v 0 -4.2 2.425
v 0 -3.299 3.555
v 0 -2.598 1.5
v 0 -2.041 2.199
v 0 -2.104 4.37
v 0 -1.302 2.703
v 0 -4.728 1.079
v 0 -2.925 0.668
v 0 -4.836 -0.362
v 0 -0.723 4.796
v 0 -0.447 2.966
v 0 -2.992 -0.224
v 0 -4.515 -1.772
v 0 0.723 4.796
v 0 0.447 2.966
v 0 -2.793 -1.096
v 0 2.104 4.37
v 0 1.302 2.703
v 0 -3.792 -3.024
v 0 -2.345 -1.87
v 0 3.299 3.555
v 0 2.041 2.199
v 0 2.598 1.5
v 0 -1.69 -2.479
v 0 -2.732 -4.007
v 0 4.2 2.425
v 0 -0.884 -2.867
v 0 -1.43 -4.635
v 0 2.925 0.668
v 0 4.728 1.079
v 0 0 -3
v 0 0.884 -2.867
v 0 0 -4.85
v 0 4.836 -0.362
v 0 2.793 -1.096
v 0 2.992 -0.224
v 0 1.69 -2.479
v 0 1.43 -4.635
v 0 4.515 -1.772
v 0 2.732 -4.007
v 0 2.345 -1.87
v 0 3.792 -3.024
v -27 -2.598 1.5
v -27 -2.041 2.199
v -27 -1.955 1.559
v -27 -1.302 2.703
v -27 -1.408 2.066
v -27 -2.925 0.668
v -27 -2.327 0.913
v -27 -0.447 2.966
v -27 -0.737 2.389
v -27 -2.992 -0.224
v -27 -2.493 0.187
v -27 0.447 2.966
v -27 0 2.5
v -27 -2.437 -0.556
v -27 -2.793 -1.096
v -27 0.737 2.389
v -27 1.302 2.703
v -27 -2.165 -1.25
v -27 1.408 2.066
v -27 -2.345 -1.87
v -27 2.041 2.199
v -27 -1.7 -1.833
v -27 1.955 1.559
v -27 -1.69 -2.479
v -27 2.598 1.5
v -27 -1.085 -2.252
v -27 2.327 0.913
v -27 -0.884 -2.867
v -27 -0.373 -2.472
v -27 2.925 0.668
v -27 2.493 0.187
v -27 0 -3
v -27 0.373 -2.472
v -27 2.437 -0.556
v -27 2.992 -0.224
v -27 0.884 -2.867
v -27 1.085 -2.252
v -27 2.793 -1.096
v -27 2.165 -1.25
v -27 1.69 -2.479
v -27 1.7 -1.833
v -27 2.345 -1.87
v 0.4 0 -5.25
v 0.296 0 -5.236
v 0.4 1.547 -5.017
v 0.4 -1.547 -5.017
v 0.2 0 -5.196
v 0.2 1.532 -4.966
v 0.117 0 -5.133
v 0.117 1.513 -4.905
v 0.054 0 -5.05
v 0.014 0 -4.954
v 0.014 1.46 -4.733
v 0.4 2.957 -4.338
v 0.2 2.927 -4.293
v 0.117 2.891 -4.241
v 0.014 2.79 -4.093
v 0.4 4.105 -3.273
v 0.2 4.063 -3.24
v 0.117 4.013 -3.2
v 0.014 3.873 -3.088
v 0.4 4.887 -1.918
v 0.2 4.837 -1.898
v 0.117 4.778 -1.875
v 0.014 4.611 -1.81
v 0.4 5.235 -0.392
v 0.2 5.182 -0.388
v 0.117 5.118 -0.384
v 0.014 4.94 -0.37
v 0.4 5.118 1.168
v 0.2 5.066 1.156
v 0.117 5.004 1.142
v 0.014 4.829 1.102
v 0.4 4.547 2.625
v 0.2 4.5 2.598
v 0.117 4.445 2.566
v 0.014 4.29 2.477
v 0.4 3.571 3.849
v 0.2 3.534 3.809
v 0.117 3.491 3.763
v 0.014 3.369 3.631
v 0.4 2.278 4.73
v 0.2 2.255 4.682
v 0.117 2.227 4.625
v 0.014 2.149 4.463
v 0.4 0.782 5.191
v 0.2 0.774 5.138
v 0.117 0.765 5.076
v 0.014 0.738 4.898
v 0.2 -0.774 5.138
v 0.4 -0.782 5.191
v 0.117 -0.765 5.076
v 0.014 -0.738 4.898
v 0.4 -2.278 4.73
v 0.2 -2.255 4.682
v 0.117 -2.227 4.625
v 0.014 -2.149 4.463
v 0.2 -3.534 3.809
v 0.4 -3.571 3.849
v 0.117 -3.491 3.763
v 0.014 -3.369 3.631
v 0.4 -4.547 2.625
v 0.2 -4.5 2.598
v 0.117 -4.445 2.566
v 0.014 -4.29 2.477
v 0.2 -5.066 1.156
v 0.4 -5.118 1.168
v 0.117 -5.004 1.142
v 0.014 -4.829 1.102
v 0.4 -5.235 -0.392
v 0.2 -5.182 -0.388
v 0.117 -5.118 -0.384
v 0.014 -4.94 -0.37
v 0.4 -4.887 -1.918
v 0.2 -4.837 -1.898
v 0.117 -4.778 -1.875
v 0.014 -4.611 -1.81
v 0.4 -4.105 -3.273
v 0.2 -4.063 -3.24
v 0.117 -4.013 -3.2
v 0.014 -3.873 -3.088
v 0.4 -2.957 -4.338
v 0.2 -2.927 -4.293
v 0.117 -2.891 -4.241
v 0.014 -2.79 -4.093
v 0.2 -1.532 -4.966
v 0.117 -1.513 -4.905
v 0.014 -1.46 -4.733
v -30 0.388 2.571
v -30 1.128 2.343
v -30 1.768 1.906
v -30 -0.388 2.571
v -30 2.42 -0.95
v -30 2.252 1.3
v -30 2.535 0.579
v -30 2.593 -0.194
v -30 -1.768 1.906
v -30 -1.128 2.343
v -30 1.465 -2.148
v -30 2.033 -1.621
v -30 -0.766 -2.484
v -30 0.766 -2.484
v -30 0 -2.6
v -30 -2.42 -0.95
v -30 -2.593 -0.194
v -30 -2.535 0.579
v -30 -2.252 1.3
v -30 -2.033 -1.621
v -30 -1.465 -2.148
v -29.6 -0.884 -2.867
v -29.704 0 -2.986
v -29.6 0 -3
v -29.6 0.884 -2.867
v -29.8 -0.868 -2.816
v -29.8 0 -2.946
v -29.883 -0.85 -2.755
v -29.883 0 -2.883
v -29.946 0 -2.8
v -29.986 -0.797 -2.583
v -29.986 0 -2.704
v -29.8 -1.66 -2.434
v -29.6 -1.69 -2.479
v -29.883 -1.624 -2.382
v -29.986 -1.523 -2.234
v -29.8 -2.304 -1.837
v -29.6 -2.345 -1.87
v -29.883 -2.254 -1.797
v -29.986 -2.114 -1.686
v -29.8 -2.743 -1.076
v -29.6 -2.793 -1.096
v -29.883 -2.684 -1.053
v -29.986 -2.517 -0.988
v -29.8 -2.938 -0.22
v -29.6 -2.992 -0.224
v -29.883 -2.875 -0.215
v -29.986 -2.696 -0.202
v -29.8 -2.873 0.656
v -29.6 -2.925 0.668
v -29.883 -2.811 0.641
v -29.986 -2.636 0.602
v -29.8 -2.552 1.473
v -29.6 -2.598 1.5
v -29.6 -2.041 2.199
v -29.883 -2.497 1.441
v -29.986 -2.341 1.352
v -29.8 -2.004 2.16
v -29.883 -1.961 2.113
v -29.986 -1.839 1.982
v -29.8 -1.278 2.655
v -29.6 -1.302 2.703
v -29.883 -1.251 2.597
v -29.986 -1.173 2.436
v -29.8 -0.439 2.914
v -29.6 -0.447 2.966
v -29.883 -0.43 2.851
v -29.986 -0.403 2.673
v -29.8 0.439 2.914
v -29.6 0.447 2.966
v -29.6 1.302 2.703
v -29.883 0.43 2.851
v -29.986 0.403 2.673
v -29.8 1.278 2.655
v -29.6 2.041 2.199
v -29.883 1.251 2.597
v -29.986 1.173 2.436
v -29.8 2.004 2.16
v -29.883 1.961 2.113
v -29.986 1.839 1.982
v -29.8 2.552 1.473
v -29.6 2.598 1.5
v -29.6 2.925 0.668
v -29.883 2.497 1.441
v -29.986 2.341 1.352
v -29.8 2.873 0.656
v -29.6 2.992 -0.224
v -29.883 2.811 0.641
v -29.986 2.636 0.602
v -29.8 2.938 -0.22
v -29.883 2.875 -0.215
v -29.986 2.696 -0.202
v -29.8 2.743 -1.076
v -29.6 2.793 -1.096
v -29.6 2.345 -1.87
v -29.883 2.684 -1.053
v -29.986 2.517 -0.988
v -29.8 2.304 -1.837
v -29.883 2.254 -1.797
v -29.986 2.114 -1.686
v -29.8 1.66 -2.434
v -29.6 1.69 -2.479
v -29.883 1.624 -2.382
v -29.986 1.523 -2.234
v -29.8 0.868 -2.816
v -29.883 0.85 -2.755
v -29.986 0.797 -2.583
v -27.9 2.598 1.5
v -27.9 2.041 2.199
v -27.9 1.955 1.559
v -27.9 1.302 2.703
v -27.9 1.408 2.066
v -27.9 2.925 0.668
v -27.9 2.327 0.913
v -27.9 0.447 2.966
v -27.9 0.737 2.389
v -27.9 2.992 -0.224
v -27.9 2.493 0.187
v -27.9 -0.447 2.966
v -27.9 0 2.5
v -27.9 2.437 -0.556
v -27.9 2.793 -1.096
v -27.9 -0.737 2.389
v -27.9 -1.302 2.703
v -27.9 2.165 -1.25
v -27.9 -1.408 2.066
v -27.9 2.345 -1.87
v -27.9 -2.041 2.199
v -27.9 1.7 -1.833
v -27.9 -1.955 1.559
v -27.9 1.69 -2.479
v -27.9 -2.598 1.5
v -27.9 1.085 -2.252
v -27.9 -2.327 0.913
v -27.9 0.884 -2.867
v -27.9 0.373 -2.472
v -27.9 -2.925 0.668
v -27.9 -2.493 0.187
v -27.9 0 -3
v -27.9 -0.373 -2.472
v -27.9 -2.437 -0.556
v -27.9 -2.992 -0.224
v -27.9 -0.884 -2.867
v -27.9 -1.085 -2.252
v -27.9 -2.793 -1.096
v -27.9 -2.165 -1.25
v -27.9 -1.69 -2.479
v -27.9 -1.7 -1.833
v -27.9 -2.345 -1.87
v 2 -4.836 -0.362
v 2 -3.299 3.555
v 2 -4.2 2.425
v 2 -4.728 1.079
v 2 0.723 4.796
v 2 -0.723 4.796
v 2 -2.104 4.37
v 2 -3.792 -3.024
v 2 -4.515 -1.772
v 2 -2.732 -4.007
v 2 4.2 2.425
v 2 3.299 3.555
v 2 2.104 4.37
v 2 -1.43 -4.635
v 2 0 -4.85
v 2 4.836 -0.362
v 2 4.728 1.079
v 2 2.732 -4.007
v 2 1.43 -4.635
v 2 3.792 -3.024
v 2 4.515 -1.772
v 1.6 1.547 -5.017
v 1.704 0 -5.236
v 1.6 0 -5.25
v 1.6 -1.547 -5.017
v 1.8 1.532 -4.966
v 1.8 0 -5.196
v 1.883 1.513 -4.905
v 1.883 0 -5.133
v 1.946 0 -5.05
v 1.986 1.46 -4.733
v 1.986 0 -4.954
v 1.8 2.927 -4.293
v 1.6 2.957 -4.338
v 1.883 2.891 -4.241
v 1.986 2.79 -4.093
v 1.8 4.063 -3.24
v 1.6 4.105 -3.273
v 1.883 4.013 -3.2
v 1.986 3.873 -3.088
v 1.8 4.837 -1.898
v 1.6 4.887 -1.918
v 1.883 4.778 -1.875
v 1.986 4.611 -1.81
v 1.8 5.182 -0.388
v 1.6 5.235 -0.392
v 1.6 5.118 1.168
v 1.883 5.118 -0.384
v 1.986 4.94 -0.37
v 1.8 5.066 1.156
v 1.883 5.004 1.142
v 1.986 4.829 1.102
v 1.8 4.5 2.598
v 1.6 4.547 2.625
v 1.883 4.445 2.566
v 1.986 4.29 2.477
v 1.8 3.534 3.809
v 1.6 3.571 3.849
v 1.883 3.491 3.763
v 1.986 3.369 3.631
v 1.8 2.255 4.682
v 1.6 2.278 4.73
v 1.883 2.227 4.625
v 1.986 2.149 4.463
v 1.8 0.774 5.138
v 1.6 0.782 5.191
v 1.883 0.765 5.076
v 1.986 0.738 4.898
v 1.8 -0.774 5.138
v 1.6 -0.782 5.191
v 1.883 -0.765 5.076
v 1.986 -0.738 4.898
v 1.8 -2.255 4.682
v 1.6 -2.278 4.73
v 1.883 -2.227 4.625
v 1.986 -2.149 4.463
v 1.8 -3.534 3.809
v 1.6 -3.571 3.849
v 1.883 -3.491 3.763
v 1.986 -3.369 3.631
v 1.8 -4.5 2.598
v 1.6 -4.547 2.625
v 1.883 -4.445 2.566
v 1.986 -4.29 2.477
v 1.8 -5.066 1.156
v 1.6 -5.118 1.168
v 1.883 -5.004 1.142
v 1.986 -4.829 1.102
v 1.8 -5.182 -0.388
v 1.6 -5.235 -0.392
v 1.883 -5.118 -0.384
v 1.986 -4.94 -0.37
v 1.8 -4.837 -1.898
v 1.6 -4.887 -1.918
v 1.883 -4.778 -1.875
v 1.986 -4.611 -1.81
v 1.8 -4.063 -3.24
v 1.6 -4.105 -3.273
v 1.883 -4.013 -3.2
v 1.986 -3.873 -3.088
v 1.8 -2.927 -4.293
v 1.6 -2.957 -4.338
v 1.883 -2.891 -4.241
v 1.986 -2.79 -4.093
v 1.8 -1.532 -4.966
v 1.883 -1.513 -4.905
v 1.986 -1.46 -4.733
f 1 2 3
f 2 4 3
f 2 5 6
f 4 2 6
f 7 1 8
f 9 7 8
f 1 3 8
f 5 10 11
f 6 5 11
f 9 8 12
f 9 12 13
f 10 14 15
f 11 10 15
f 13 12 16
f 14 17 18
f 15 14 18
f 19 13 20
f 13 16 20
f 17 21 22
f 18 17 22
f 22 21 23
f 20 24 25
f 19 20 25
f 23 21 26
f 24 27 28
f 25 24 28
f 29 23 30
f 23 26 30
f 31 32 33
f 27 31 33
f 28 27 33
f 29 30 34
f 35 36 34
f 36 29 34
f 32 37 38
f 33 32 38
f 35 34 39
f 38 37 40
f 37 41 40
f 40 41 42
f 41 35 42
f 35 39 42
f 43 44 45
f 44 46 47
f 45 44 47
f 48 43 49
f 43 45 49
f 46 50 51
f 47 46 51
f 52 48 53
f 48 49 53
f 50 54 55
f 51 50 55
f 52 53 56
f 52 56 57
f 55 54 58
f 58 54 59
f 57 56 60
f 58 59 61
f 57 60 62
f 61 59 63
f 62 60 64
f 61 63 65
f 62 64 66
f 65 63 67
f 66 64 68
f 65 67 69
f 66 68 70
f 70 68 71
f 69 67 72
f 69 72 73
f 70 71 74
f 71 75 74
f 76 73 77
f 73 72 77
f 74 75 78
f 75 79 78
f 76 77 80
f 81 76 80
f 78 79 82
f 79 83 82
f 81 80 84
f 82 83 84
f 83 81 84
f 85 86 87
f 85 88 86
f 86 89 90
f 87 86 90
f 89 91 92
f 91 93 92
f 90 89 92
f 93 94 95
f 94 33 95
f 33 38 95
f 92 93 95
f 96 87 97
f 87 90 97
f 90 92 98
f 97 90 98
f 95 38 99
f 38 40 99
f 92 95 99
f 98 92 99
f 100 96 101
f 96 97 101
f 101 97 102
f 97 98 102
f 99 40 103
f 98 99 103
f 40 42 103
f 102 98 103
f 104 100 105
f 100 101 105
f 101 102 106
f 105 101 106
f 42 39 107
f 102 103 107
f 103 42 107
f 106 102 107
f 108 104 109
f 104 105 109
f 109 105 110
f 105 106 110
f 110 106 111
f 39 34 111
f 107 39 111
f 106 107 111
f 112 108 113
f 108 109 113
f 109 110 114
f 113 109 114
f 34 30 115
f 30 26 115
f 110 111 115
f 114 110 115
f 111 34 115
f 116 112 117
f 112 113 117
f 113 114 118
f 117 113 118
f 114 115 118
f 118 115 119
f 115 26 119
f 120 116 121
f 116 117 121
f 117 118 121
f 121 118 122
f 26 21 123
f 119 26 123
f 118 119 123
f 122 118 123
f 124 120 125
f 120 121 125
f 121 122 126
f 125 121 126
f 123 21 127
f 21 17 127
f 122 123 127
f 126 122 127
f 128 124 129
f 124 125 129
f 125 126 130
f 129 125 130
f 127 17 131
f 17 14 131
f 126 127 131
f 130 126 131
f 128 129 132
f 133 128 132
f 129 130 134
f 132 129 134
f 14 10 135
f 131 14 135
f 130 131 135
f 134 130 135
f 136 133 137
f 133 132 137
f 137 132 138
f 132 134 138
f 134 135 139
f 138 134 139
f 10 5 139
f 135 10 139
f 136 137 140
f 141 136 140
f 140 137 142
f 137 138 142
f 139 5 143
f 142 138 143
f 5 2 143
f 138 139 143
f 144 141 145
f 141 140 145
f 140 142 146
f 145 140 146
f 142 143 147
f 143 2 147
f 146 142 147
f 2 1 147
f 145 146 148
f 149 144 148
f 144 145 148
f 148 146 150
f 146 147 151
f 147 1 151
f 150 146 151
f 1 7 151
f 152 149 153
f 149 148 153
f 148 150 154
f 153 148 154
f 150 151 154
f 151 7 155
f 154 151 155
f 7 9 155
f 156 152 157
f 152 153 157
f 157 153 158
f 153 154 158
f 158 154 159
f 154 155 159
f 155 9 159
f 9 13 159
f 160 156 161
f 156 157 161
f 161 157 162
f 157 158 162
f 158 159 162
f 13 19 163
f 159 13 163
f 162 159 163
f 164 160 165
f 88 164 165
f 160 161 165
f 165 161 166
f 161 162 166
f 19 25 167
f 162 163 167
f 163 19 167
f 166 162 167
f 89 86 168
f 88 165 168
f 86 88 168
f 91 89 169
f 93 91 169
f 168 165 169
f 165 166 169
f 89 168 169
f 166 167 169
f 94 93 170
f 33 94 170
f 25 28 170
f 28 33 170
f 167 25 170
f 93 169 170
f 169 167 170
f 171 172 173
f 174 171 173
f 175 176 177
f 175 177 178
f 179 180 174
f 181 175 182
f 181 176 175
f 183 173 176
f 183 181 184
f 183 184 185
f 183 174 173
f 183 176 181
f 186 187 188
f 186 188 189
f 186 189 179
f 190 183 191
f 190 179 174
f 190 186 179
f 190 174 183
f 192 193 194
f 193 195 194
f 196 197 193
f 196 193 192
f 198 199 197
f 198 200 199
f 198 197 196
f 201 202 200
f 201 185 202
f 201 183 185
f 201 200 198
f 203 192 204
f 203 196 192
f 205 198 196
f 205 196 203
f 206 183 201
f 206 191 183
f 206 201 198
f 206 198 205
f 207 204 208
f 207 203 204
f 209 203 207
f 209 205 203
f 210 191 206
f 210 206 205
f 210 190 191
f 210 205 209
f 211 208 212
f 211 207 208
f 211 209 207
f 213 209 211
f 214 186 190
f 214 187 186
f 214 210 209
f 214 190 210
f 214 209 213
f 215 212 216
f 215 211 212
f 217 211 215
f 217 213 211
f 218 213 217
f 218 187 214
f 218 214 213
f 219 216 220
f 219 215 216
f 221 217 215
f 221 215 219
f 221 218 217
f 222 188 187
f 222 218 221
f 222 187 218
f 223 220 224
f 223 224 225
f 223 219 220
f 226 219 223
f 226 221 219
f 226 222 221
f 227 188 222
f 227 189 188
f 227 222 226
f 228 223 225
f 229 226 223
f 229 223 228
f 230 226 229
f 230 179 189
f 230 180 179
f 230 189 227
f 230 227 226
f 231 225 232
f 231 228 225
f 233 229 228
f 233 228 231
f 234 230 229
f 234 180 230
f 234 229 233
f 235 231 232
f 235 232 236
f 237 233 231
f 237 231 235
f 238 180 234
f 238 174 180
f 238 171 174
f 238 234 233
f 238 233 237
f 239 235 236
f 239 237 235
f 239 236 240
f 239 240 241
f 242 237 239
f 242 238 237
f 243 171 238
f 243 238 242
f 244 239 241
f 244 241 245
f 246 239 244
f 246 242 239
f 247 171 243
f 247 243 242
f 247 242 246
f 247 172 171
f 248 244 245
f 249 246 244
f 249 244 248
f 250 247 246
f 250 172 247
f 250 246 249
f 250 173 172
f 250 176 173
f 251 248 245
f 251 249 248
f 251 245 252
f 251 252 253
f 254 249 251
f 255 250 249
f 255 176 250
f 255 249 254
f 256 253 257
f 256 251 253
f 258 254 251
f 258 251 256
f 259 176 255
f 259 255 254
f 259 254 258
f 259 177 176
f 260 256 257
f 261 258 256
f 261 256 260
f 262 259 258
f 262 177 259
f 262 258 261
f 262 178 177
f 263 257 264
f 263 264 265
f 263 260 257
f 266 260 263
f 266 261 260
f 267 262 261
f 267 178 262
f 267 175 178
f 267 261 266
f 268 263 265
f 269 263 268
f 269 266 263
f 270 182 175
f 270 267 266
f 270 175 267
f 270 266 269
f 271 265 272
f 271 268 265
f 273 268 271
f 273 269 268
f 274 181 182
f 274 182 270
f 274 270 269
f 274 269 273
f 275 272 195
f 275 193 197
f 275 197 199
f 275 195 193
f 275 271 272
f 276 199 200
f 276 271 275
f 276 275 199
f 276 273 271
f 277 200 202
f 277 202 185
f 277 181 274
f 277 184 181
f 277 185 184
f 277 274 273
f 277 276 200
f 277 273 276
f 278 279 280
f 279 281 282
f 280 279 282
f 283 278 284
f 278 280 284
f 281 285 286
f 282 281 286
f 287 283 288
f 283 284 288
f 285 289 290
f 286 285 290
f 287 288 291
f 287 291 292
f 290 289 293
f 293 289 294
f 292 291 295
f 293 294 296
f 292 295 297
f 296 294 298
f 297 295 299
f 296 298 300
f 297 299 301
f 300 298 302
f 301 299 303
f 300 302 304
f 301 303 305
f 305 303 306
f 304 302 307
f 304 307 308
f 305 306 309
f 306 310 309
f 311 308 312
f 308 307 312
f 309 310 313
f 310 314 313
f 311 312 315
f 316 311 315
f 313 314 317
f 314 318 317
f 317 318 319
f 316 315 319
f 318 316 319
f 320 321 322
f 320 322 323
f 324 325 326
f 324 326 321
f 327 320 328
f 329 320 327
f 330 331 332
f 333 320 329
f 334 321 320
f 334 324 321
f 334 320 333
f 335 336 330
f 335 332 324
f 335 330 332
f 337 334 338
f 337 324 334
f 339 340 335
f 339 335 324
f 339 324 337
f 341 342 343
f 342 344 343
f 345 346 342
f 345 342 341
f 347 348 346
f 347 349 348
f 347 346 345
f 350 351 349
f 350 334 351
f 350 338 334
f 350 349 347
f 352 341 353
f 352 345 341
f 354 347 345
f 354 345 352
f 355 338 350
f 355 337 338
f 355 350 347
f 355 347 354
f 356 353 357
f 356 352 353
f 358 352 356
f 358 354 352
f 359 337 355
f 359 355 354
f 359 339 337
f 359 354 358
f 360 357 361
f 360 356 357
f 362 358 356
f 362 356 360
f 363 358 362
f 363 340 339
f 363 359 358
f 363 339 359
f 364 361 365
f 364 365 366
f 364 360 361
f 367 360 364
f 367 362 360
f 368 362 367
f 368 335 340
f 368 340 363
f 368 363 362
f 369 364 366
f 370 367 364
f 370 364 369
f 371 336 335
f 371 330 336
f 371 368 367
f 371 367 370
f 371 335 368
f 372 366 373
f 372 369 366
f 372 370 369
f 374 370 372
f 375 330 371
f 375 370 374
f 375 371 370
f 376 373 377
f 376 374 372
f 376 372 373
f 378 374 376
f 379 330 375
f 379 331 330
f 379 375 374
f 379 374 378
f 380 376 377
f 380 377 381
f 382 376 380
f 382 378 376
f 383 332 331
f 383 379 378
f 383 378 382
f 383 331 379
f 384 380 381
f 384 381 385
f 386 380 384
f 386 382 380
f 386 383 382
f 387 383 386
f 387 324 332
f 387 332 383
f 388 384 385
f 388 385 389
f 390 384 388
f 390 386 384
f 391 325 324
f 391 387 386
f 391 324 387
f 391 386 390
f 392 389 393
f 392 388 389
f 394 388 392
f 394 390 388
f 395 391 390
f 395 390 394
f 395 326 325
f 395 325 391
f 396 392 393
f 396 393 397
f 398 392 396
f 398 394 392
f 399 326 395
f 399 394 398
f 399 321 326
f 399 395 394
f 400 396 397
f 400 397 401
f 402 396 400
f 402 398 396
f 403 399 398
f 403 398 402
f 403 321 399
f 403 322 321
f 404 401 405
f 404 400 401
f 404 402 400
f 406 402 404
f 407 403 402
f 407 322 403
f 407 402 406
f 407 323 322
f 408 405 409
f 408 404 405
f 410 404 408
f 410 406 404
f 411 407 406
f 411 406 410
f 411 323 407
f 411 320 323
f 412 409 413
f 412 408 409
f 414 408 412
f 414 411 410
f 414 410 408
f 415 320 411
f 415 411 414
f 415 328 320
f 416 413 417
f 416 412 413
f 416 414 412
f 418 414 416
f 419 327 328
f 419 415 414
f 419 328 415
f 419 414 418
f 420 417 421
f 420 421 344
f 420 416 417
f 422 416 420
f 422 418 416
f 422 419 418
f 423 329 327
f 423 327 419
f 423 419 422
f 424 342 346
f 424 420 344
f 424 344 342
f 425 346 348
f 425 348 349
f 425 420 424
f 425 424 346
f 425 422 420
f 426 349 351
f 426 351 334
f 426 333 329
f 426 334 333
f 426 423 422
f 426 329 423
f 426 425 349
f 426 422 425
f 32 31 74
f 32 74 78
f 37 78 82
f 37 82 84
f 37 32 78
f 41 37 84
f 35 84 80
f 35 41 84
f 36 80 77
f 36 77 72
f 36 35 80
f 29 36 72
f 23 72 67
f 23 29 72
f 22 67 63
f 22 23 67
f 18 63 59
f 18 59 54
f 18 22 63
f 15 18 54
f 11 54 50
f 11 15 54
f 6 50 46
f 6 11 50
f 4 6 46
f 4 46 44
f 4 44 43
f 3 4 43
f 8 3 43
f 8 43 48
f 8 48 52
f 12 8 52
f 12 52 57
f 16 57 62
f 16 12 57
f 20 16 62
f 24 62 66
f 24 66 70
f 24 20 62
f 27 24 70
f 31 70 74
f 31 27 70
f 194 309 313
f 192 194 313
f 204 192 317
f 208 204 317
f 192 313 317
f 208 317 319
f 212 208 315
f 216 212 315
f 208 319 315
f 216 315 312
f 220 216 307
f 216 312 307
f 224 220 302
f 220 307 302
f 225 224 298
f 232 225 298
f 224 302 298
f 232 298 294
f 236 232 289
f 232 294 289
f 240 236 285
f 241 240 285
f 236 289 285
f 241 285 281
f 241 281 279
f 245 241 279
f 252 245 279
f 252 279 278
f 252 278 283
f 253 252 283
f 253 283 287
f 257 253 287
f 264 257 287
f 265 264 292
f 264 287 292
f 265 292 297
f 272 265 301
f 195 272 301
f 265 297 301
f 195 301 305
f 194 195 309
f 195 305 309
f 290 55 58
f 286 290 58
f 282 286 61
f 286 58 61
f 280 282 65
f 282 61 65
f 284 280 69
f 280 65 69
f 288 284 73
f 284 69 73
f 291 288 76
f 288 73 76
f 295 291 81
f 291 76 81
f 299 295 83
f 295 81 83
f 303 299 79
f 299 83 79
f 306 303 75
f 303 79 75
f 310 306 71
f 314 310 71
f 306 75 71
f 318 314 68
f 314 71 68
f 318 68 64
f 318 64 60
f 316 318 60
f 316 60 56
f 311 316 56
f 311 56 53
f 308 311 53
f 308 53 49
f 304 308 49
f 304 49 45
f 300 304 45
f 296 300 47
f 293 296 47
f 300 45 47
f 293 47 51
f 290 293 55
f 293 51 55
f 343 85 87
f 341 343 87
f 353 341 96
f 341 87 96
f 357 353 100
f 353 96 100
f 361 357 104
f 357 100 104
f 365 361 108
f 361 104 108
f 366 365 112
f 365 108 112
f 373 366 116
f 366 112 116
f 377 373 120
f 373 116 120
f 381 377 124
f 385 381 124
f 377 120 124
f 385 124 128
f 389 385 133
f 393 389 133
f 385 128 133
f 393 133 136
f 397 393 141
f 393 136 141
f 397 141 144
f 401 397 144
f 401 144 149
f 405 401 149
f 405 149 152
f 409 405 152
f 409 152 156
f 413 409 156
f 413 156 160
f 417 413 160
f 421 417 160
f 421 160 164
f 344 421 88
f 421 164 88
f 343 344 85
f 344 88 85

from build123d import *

# Parameters (mm, degrees)
SKETCH_1_R      = 5.25
EXTRUDE_1_DEPTH = 2
SKETCH_1_4_R    = 3
EXTRUDE_2_DEPTH = 27
FILLET_1_R      = 0.4
SKETCH_2_R      = 2.5
EXTRUDE_3_DEPTH = 0.9
SKETCH_3_R      = 3
EXTRUDE_4_DEPTH = 2.1
FILLET_2_R      = 0.4


with BuildPart() as part:
    # 草图1 → 凸台-拉伸1 (new body)
    with BuildSketch(Plane(origin=(0, 0, 0), x_dir=(0, 0, -1), z_dir=(1, 0, 0))):
        Circle(SKETCH_1_R)
    extrude(amount=EXTRUDE_1_DEPTH)

    # 草图1<4> → 凸台-拉伸2 (add)
    with BuildSketch(Plane(origin=(0, 0, 0), x_dir=(0, 0, -1), z_dir=(1, 0, 0))):
        Circle(SKETCH_1_4_R)
    extrude(amount=-EXTRUDE_2_DEPTH)

    # 圆角1
    fillet_1_edges = [part.edges().sort_by_distance(p)[0] for p in [
        (2, 0, 5.25),
        (0, 0, 5.25),
    ]]
    fillet(fillet_1_edges, radius=FILLET_1_R)

    # 草图2 → 凸台-拉伸3 (add)
    with BuildSketch(Plane.ZY.offset(27)):
        Circle(SKETCH_2_R)
    extrude(amount=EXTRUDE_3_DEPTH)

    # 草图3 → 凸台-拉伸4 (add)
    with BuildSketch(Plane.ZY.offset(27.9)):
        Circle(SKETCH_3_R)
    extrude(amount=EXTRUDE_4_DEPTH)

    # 圆角2
    fillet_2_edges = [part.edges().sort_by_distance(p)[0] for p in [
        (-30, 0, -3),
    ]]
    fillet(fillet_2_edges, radius=FILLET_2_R)


solid = part.part
